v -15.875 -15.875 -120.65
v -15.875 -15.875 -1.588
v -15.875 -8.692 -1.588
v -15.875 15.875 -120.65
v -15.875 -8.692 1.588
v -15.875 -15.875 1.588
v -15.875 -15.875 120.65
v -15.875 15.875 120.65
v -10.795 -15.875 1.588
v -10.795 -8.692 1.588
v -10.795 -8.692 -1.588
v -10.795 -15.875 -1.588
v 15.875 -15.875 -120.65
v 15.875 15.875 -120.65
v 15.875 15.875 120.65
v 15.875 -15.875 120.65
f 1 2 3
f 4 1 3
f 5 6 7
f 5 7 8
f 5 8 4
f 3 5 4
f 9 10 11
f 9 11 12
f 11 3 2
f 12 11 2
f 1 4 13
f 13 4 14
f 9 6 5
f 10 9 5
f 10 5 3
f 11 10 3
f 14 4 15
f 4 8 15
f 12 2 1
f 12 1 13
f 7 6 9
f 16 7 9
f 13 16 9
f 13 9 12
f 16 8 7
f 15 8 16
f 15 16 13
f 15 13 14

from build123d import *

# Parameters (mm, degrees)
F0_W     = 31.75
F0_H     = 31.75
F1_DEPTH = 120.65
F3_DEPTH = 5.08


with BuildPart() as f1:
    # F0 (on Top) → F1 (new body, symmetric)
    with BuildSketch(Plane.XY):
        Rectangle(F0_W, F0_H)
    extrude(amount=F1_DEPTH, both=True)

    # F2 (on face) → F3 (cut)
    with BuildSketch(Plane(origin=(-15.875, 0, 0), x_dir=(0, -1, 0), z_dir=(-1, 0, 0))):
        Polygon((15.875, 0), (15.875, 1.5875), (8.69188, 1.5875), (8.69188, 0), (8.69188, -1.5875), (15.875, -1.5875), align=None)
    extrude(amount=-F3_DEPTH, mode=Mode.SUBTRACT)


solid = f1.part
